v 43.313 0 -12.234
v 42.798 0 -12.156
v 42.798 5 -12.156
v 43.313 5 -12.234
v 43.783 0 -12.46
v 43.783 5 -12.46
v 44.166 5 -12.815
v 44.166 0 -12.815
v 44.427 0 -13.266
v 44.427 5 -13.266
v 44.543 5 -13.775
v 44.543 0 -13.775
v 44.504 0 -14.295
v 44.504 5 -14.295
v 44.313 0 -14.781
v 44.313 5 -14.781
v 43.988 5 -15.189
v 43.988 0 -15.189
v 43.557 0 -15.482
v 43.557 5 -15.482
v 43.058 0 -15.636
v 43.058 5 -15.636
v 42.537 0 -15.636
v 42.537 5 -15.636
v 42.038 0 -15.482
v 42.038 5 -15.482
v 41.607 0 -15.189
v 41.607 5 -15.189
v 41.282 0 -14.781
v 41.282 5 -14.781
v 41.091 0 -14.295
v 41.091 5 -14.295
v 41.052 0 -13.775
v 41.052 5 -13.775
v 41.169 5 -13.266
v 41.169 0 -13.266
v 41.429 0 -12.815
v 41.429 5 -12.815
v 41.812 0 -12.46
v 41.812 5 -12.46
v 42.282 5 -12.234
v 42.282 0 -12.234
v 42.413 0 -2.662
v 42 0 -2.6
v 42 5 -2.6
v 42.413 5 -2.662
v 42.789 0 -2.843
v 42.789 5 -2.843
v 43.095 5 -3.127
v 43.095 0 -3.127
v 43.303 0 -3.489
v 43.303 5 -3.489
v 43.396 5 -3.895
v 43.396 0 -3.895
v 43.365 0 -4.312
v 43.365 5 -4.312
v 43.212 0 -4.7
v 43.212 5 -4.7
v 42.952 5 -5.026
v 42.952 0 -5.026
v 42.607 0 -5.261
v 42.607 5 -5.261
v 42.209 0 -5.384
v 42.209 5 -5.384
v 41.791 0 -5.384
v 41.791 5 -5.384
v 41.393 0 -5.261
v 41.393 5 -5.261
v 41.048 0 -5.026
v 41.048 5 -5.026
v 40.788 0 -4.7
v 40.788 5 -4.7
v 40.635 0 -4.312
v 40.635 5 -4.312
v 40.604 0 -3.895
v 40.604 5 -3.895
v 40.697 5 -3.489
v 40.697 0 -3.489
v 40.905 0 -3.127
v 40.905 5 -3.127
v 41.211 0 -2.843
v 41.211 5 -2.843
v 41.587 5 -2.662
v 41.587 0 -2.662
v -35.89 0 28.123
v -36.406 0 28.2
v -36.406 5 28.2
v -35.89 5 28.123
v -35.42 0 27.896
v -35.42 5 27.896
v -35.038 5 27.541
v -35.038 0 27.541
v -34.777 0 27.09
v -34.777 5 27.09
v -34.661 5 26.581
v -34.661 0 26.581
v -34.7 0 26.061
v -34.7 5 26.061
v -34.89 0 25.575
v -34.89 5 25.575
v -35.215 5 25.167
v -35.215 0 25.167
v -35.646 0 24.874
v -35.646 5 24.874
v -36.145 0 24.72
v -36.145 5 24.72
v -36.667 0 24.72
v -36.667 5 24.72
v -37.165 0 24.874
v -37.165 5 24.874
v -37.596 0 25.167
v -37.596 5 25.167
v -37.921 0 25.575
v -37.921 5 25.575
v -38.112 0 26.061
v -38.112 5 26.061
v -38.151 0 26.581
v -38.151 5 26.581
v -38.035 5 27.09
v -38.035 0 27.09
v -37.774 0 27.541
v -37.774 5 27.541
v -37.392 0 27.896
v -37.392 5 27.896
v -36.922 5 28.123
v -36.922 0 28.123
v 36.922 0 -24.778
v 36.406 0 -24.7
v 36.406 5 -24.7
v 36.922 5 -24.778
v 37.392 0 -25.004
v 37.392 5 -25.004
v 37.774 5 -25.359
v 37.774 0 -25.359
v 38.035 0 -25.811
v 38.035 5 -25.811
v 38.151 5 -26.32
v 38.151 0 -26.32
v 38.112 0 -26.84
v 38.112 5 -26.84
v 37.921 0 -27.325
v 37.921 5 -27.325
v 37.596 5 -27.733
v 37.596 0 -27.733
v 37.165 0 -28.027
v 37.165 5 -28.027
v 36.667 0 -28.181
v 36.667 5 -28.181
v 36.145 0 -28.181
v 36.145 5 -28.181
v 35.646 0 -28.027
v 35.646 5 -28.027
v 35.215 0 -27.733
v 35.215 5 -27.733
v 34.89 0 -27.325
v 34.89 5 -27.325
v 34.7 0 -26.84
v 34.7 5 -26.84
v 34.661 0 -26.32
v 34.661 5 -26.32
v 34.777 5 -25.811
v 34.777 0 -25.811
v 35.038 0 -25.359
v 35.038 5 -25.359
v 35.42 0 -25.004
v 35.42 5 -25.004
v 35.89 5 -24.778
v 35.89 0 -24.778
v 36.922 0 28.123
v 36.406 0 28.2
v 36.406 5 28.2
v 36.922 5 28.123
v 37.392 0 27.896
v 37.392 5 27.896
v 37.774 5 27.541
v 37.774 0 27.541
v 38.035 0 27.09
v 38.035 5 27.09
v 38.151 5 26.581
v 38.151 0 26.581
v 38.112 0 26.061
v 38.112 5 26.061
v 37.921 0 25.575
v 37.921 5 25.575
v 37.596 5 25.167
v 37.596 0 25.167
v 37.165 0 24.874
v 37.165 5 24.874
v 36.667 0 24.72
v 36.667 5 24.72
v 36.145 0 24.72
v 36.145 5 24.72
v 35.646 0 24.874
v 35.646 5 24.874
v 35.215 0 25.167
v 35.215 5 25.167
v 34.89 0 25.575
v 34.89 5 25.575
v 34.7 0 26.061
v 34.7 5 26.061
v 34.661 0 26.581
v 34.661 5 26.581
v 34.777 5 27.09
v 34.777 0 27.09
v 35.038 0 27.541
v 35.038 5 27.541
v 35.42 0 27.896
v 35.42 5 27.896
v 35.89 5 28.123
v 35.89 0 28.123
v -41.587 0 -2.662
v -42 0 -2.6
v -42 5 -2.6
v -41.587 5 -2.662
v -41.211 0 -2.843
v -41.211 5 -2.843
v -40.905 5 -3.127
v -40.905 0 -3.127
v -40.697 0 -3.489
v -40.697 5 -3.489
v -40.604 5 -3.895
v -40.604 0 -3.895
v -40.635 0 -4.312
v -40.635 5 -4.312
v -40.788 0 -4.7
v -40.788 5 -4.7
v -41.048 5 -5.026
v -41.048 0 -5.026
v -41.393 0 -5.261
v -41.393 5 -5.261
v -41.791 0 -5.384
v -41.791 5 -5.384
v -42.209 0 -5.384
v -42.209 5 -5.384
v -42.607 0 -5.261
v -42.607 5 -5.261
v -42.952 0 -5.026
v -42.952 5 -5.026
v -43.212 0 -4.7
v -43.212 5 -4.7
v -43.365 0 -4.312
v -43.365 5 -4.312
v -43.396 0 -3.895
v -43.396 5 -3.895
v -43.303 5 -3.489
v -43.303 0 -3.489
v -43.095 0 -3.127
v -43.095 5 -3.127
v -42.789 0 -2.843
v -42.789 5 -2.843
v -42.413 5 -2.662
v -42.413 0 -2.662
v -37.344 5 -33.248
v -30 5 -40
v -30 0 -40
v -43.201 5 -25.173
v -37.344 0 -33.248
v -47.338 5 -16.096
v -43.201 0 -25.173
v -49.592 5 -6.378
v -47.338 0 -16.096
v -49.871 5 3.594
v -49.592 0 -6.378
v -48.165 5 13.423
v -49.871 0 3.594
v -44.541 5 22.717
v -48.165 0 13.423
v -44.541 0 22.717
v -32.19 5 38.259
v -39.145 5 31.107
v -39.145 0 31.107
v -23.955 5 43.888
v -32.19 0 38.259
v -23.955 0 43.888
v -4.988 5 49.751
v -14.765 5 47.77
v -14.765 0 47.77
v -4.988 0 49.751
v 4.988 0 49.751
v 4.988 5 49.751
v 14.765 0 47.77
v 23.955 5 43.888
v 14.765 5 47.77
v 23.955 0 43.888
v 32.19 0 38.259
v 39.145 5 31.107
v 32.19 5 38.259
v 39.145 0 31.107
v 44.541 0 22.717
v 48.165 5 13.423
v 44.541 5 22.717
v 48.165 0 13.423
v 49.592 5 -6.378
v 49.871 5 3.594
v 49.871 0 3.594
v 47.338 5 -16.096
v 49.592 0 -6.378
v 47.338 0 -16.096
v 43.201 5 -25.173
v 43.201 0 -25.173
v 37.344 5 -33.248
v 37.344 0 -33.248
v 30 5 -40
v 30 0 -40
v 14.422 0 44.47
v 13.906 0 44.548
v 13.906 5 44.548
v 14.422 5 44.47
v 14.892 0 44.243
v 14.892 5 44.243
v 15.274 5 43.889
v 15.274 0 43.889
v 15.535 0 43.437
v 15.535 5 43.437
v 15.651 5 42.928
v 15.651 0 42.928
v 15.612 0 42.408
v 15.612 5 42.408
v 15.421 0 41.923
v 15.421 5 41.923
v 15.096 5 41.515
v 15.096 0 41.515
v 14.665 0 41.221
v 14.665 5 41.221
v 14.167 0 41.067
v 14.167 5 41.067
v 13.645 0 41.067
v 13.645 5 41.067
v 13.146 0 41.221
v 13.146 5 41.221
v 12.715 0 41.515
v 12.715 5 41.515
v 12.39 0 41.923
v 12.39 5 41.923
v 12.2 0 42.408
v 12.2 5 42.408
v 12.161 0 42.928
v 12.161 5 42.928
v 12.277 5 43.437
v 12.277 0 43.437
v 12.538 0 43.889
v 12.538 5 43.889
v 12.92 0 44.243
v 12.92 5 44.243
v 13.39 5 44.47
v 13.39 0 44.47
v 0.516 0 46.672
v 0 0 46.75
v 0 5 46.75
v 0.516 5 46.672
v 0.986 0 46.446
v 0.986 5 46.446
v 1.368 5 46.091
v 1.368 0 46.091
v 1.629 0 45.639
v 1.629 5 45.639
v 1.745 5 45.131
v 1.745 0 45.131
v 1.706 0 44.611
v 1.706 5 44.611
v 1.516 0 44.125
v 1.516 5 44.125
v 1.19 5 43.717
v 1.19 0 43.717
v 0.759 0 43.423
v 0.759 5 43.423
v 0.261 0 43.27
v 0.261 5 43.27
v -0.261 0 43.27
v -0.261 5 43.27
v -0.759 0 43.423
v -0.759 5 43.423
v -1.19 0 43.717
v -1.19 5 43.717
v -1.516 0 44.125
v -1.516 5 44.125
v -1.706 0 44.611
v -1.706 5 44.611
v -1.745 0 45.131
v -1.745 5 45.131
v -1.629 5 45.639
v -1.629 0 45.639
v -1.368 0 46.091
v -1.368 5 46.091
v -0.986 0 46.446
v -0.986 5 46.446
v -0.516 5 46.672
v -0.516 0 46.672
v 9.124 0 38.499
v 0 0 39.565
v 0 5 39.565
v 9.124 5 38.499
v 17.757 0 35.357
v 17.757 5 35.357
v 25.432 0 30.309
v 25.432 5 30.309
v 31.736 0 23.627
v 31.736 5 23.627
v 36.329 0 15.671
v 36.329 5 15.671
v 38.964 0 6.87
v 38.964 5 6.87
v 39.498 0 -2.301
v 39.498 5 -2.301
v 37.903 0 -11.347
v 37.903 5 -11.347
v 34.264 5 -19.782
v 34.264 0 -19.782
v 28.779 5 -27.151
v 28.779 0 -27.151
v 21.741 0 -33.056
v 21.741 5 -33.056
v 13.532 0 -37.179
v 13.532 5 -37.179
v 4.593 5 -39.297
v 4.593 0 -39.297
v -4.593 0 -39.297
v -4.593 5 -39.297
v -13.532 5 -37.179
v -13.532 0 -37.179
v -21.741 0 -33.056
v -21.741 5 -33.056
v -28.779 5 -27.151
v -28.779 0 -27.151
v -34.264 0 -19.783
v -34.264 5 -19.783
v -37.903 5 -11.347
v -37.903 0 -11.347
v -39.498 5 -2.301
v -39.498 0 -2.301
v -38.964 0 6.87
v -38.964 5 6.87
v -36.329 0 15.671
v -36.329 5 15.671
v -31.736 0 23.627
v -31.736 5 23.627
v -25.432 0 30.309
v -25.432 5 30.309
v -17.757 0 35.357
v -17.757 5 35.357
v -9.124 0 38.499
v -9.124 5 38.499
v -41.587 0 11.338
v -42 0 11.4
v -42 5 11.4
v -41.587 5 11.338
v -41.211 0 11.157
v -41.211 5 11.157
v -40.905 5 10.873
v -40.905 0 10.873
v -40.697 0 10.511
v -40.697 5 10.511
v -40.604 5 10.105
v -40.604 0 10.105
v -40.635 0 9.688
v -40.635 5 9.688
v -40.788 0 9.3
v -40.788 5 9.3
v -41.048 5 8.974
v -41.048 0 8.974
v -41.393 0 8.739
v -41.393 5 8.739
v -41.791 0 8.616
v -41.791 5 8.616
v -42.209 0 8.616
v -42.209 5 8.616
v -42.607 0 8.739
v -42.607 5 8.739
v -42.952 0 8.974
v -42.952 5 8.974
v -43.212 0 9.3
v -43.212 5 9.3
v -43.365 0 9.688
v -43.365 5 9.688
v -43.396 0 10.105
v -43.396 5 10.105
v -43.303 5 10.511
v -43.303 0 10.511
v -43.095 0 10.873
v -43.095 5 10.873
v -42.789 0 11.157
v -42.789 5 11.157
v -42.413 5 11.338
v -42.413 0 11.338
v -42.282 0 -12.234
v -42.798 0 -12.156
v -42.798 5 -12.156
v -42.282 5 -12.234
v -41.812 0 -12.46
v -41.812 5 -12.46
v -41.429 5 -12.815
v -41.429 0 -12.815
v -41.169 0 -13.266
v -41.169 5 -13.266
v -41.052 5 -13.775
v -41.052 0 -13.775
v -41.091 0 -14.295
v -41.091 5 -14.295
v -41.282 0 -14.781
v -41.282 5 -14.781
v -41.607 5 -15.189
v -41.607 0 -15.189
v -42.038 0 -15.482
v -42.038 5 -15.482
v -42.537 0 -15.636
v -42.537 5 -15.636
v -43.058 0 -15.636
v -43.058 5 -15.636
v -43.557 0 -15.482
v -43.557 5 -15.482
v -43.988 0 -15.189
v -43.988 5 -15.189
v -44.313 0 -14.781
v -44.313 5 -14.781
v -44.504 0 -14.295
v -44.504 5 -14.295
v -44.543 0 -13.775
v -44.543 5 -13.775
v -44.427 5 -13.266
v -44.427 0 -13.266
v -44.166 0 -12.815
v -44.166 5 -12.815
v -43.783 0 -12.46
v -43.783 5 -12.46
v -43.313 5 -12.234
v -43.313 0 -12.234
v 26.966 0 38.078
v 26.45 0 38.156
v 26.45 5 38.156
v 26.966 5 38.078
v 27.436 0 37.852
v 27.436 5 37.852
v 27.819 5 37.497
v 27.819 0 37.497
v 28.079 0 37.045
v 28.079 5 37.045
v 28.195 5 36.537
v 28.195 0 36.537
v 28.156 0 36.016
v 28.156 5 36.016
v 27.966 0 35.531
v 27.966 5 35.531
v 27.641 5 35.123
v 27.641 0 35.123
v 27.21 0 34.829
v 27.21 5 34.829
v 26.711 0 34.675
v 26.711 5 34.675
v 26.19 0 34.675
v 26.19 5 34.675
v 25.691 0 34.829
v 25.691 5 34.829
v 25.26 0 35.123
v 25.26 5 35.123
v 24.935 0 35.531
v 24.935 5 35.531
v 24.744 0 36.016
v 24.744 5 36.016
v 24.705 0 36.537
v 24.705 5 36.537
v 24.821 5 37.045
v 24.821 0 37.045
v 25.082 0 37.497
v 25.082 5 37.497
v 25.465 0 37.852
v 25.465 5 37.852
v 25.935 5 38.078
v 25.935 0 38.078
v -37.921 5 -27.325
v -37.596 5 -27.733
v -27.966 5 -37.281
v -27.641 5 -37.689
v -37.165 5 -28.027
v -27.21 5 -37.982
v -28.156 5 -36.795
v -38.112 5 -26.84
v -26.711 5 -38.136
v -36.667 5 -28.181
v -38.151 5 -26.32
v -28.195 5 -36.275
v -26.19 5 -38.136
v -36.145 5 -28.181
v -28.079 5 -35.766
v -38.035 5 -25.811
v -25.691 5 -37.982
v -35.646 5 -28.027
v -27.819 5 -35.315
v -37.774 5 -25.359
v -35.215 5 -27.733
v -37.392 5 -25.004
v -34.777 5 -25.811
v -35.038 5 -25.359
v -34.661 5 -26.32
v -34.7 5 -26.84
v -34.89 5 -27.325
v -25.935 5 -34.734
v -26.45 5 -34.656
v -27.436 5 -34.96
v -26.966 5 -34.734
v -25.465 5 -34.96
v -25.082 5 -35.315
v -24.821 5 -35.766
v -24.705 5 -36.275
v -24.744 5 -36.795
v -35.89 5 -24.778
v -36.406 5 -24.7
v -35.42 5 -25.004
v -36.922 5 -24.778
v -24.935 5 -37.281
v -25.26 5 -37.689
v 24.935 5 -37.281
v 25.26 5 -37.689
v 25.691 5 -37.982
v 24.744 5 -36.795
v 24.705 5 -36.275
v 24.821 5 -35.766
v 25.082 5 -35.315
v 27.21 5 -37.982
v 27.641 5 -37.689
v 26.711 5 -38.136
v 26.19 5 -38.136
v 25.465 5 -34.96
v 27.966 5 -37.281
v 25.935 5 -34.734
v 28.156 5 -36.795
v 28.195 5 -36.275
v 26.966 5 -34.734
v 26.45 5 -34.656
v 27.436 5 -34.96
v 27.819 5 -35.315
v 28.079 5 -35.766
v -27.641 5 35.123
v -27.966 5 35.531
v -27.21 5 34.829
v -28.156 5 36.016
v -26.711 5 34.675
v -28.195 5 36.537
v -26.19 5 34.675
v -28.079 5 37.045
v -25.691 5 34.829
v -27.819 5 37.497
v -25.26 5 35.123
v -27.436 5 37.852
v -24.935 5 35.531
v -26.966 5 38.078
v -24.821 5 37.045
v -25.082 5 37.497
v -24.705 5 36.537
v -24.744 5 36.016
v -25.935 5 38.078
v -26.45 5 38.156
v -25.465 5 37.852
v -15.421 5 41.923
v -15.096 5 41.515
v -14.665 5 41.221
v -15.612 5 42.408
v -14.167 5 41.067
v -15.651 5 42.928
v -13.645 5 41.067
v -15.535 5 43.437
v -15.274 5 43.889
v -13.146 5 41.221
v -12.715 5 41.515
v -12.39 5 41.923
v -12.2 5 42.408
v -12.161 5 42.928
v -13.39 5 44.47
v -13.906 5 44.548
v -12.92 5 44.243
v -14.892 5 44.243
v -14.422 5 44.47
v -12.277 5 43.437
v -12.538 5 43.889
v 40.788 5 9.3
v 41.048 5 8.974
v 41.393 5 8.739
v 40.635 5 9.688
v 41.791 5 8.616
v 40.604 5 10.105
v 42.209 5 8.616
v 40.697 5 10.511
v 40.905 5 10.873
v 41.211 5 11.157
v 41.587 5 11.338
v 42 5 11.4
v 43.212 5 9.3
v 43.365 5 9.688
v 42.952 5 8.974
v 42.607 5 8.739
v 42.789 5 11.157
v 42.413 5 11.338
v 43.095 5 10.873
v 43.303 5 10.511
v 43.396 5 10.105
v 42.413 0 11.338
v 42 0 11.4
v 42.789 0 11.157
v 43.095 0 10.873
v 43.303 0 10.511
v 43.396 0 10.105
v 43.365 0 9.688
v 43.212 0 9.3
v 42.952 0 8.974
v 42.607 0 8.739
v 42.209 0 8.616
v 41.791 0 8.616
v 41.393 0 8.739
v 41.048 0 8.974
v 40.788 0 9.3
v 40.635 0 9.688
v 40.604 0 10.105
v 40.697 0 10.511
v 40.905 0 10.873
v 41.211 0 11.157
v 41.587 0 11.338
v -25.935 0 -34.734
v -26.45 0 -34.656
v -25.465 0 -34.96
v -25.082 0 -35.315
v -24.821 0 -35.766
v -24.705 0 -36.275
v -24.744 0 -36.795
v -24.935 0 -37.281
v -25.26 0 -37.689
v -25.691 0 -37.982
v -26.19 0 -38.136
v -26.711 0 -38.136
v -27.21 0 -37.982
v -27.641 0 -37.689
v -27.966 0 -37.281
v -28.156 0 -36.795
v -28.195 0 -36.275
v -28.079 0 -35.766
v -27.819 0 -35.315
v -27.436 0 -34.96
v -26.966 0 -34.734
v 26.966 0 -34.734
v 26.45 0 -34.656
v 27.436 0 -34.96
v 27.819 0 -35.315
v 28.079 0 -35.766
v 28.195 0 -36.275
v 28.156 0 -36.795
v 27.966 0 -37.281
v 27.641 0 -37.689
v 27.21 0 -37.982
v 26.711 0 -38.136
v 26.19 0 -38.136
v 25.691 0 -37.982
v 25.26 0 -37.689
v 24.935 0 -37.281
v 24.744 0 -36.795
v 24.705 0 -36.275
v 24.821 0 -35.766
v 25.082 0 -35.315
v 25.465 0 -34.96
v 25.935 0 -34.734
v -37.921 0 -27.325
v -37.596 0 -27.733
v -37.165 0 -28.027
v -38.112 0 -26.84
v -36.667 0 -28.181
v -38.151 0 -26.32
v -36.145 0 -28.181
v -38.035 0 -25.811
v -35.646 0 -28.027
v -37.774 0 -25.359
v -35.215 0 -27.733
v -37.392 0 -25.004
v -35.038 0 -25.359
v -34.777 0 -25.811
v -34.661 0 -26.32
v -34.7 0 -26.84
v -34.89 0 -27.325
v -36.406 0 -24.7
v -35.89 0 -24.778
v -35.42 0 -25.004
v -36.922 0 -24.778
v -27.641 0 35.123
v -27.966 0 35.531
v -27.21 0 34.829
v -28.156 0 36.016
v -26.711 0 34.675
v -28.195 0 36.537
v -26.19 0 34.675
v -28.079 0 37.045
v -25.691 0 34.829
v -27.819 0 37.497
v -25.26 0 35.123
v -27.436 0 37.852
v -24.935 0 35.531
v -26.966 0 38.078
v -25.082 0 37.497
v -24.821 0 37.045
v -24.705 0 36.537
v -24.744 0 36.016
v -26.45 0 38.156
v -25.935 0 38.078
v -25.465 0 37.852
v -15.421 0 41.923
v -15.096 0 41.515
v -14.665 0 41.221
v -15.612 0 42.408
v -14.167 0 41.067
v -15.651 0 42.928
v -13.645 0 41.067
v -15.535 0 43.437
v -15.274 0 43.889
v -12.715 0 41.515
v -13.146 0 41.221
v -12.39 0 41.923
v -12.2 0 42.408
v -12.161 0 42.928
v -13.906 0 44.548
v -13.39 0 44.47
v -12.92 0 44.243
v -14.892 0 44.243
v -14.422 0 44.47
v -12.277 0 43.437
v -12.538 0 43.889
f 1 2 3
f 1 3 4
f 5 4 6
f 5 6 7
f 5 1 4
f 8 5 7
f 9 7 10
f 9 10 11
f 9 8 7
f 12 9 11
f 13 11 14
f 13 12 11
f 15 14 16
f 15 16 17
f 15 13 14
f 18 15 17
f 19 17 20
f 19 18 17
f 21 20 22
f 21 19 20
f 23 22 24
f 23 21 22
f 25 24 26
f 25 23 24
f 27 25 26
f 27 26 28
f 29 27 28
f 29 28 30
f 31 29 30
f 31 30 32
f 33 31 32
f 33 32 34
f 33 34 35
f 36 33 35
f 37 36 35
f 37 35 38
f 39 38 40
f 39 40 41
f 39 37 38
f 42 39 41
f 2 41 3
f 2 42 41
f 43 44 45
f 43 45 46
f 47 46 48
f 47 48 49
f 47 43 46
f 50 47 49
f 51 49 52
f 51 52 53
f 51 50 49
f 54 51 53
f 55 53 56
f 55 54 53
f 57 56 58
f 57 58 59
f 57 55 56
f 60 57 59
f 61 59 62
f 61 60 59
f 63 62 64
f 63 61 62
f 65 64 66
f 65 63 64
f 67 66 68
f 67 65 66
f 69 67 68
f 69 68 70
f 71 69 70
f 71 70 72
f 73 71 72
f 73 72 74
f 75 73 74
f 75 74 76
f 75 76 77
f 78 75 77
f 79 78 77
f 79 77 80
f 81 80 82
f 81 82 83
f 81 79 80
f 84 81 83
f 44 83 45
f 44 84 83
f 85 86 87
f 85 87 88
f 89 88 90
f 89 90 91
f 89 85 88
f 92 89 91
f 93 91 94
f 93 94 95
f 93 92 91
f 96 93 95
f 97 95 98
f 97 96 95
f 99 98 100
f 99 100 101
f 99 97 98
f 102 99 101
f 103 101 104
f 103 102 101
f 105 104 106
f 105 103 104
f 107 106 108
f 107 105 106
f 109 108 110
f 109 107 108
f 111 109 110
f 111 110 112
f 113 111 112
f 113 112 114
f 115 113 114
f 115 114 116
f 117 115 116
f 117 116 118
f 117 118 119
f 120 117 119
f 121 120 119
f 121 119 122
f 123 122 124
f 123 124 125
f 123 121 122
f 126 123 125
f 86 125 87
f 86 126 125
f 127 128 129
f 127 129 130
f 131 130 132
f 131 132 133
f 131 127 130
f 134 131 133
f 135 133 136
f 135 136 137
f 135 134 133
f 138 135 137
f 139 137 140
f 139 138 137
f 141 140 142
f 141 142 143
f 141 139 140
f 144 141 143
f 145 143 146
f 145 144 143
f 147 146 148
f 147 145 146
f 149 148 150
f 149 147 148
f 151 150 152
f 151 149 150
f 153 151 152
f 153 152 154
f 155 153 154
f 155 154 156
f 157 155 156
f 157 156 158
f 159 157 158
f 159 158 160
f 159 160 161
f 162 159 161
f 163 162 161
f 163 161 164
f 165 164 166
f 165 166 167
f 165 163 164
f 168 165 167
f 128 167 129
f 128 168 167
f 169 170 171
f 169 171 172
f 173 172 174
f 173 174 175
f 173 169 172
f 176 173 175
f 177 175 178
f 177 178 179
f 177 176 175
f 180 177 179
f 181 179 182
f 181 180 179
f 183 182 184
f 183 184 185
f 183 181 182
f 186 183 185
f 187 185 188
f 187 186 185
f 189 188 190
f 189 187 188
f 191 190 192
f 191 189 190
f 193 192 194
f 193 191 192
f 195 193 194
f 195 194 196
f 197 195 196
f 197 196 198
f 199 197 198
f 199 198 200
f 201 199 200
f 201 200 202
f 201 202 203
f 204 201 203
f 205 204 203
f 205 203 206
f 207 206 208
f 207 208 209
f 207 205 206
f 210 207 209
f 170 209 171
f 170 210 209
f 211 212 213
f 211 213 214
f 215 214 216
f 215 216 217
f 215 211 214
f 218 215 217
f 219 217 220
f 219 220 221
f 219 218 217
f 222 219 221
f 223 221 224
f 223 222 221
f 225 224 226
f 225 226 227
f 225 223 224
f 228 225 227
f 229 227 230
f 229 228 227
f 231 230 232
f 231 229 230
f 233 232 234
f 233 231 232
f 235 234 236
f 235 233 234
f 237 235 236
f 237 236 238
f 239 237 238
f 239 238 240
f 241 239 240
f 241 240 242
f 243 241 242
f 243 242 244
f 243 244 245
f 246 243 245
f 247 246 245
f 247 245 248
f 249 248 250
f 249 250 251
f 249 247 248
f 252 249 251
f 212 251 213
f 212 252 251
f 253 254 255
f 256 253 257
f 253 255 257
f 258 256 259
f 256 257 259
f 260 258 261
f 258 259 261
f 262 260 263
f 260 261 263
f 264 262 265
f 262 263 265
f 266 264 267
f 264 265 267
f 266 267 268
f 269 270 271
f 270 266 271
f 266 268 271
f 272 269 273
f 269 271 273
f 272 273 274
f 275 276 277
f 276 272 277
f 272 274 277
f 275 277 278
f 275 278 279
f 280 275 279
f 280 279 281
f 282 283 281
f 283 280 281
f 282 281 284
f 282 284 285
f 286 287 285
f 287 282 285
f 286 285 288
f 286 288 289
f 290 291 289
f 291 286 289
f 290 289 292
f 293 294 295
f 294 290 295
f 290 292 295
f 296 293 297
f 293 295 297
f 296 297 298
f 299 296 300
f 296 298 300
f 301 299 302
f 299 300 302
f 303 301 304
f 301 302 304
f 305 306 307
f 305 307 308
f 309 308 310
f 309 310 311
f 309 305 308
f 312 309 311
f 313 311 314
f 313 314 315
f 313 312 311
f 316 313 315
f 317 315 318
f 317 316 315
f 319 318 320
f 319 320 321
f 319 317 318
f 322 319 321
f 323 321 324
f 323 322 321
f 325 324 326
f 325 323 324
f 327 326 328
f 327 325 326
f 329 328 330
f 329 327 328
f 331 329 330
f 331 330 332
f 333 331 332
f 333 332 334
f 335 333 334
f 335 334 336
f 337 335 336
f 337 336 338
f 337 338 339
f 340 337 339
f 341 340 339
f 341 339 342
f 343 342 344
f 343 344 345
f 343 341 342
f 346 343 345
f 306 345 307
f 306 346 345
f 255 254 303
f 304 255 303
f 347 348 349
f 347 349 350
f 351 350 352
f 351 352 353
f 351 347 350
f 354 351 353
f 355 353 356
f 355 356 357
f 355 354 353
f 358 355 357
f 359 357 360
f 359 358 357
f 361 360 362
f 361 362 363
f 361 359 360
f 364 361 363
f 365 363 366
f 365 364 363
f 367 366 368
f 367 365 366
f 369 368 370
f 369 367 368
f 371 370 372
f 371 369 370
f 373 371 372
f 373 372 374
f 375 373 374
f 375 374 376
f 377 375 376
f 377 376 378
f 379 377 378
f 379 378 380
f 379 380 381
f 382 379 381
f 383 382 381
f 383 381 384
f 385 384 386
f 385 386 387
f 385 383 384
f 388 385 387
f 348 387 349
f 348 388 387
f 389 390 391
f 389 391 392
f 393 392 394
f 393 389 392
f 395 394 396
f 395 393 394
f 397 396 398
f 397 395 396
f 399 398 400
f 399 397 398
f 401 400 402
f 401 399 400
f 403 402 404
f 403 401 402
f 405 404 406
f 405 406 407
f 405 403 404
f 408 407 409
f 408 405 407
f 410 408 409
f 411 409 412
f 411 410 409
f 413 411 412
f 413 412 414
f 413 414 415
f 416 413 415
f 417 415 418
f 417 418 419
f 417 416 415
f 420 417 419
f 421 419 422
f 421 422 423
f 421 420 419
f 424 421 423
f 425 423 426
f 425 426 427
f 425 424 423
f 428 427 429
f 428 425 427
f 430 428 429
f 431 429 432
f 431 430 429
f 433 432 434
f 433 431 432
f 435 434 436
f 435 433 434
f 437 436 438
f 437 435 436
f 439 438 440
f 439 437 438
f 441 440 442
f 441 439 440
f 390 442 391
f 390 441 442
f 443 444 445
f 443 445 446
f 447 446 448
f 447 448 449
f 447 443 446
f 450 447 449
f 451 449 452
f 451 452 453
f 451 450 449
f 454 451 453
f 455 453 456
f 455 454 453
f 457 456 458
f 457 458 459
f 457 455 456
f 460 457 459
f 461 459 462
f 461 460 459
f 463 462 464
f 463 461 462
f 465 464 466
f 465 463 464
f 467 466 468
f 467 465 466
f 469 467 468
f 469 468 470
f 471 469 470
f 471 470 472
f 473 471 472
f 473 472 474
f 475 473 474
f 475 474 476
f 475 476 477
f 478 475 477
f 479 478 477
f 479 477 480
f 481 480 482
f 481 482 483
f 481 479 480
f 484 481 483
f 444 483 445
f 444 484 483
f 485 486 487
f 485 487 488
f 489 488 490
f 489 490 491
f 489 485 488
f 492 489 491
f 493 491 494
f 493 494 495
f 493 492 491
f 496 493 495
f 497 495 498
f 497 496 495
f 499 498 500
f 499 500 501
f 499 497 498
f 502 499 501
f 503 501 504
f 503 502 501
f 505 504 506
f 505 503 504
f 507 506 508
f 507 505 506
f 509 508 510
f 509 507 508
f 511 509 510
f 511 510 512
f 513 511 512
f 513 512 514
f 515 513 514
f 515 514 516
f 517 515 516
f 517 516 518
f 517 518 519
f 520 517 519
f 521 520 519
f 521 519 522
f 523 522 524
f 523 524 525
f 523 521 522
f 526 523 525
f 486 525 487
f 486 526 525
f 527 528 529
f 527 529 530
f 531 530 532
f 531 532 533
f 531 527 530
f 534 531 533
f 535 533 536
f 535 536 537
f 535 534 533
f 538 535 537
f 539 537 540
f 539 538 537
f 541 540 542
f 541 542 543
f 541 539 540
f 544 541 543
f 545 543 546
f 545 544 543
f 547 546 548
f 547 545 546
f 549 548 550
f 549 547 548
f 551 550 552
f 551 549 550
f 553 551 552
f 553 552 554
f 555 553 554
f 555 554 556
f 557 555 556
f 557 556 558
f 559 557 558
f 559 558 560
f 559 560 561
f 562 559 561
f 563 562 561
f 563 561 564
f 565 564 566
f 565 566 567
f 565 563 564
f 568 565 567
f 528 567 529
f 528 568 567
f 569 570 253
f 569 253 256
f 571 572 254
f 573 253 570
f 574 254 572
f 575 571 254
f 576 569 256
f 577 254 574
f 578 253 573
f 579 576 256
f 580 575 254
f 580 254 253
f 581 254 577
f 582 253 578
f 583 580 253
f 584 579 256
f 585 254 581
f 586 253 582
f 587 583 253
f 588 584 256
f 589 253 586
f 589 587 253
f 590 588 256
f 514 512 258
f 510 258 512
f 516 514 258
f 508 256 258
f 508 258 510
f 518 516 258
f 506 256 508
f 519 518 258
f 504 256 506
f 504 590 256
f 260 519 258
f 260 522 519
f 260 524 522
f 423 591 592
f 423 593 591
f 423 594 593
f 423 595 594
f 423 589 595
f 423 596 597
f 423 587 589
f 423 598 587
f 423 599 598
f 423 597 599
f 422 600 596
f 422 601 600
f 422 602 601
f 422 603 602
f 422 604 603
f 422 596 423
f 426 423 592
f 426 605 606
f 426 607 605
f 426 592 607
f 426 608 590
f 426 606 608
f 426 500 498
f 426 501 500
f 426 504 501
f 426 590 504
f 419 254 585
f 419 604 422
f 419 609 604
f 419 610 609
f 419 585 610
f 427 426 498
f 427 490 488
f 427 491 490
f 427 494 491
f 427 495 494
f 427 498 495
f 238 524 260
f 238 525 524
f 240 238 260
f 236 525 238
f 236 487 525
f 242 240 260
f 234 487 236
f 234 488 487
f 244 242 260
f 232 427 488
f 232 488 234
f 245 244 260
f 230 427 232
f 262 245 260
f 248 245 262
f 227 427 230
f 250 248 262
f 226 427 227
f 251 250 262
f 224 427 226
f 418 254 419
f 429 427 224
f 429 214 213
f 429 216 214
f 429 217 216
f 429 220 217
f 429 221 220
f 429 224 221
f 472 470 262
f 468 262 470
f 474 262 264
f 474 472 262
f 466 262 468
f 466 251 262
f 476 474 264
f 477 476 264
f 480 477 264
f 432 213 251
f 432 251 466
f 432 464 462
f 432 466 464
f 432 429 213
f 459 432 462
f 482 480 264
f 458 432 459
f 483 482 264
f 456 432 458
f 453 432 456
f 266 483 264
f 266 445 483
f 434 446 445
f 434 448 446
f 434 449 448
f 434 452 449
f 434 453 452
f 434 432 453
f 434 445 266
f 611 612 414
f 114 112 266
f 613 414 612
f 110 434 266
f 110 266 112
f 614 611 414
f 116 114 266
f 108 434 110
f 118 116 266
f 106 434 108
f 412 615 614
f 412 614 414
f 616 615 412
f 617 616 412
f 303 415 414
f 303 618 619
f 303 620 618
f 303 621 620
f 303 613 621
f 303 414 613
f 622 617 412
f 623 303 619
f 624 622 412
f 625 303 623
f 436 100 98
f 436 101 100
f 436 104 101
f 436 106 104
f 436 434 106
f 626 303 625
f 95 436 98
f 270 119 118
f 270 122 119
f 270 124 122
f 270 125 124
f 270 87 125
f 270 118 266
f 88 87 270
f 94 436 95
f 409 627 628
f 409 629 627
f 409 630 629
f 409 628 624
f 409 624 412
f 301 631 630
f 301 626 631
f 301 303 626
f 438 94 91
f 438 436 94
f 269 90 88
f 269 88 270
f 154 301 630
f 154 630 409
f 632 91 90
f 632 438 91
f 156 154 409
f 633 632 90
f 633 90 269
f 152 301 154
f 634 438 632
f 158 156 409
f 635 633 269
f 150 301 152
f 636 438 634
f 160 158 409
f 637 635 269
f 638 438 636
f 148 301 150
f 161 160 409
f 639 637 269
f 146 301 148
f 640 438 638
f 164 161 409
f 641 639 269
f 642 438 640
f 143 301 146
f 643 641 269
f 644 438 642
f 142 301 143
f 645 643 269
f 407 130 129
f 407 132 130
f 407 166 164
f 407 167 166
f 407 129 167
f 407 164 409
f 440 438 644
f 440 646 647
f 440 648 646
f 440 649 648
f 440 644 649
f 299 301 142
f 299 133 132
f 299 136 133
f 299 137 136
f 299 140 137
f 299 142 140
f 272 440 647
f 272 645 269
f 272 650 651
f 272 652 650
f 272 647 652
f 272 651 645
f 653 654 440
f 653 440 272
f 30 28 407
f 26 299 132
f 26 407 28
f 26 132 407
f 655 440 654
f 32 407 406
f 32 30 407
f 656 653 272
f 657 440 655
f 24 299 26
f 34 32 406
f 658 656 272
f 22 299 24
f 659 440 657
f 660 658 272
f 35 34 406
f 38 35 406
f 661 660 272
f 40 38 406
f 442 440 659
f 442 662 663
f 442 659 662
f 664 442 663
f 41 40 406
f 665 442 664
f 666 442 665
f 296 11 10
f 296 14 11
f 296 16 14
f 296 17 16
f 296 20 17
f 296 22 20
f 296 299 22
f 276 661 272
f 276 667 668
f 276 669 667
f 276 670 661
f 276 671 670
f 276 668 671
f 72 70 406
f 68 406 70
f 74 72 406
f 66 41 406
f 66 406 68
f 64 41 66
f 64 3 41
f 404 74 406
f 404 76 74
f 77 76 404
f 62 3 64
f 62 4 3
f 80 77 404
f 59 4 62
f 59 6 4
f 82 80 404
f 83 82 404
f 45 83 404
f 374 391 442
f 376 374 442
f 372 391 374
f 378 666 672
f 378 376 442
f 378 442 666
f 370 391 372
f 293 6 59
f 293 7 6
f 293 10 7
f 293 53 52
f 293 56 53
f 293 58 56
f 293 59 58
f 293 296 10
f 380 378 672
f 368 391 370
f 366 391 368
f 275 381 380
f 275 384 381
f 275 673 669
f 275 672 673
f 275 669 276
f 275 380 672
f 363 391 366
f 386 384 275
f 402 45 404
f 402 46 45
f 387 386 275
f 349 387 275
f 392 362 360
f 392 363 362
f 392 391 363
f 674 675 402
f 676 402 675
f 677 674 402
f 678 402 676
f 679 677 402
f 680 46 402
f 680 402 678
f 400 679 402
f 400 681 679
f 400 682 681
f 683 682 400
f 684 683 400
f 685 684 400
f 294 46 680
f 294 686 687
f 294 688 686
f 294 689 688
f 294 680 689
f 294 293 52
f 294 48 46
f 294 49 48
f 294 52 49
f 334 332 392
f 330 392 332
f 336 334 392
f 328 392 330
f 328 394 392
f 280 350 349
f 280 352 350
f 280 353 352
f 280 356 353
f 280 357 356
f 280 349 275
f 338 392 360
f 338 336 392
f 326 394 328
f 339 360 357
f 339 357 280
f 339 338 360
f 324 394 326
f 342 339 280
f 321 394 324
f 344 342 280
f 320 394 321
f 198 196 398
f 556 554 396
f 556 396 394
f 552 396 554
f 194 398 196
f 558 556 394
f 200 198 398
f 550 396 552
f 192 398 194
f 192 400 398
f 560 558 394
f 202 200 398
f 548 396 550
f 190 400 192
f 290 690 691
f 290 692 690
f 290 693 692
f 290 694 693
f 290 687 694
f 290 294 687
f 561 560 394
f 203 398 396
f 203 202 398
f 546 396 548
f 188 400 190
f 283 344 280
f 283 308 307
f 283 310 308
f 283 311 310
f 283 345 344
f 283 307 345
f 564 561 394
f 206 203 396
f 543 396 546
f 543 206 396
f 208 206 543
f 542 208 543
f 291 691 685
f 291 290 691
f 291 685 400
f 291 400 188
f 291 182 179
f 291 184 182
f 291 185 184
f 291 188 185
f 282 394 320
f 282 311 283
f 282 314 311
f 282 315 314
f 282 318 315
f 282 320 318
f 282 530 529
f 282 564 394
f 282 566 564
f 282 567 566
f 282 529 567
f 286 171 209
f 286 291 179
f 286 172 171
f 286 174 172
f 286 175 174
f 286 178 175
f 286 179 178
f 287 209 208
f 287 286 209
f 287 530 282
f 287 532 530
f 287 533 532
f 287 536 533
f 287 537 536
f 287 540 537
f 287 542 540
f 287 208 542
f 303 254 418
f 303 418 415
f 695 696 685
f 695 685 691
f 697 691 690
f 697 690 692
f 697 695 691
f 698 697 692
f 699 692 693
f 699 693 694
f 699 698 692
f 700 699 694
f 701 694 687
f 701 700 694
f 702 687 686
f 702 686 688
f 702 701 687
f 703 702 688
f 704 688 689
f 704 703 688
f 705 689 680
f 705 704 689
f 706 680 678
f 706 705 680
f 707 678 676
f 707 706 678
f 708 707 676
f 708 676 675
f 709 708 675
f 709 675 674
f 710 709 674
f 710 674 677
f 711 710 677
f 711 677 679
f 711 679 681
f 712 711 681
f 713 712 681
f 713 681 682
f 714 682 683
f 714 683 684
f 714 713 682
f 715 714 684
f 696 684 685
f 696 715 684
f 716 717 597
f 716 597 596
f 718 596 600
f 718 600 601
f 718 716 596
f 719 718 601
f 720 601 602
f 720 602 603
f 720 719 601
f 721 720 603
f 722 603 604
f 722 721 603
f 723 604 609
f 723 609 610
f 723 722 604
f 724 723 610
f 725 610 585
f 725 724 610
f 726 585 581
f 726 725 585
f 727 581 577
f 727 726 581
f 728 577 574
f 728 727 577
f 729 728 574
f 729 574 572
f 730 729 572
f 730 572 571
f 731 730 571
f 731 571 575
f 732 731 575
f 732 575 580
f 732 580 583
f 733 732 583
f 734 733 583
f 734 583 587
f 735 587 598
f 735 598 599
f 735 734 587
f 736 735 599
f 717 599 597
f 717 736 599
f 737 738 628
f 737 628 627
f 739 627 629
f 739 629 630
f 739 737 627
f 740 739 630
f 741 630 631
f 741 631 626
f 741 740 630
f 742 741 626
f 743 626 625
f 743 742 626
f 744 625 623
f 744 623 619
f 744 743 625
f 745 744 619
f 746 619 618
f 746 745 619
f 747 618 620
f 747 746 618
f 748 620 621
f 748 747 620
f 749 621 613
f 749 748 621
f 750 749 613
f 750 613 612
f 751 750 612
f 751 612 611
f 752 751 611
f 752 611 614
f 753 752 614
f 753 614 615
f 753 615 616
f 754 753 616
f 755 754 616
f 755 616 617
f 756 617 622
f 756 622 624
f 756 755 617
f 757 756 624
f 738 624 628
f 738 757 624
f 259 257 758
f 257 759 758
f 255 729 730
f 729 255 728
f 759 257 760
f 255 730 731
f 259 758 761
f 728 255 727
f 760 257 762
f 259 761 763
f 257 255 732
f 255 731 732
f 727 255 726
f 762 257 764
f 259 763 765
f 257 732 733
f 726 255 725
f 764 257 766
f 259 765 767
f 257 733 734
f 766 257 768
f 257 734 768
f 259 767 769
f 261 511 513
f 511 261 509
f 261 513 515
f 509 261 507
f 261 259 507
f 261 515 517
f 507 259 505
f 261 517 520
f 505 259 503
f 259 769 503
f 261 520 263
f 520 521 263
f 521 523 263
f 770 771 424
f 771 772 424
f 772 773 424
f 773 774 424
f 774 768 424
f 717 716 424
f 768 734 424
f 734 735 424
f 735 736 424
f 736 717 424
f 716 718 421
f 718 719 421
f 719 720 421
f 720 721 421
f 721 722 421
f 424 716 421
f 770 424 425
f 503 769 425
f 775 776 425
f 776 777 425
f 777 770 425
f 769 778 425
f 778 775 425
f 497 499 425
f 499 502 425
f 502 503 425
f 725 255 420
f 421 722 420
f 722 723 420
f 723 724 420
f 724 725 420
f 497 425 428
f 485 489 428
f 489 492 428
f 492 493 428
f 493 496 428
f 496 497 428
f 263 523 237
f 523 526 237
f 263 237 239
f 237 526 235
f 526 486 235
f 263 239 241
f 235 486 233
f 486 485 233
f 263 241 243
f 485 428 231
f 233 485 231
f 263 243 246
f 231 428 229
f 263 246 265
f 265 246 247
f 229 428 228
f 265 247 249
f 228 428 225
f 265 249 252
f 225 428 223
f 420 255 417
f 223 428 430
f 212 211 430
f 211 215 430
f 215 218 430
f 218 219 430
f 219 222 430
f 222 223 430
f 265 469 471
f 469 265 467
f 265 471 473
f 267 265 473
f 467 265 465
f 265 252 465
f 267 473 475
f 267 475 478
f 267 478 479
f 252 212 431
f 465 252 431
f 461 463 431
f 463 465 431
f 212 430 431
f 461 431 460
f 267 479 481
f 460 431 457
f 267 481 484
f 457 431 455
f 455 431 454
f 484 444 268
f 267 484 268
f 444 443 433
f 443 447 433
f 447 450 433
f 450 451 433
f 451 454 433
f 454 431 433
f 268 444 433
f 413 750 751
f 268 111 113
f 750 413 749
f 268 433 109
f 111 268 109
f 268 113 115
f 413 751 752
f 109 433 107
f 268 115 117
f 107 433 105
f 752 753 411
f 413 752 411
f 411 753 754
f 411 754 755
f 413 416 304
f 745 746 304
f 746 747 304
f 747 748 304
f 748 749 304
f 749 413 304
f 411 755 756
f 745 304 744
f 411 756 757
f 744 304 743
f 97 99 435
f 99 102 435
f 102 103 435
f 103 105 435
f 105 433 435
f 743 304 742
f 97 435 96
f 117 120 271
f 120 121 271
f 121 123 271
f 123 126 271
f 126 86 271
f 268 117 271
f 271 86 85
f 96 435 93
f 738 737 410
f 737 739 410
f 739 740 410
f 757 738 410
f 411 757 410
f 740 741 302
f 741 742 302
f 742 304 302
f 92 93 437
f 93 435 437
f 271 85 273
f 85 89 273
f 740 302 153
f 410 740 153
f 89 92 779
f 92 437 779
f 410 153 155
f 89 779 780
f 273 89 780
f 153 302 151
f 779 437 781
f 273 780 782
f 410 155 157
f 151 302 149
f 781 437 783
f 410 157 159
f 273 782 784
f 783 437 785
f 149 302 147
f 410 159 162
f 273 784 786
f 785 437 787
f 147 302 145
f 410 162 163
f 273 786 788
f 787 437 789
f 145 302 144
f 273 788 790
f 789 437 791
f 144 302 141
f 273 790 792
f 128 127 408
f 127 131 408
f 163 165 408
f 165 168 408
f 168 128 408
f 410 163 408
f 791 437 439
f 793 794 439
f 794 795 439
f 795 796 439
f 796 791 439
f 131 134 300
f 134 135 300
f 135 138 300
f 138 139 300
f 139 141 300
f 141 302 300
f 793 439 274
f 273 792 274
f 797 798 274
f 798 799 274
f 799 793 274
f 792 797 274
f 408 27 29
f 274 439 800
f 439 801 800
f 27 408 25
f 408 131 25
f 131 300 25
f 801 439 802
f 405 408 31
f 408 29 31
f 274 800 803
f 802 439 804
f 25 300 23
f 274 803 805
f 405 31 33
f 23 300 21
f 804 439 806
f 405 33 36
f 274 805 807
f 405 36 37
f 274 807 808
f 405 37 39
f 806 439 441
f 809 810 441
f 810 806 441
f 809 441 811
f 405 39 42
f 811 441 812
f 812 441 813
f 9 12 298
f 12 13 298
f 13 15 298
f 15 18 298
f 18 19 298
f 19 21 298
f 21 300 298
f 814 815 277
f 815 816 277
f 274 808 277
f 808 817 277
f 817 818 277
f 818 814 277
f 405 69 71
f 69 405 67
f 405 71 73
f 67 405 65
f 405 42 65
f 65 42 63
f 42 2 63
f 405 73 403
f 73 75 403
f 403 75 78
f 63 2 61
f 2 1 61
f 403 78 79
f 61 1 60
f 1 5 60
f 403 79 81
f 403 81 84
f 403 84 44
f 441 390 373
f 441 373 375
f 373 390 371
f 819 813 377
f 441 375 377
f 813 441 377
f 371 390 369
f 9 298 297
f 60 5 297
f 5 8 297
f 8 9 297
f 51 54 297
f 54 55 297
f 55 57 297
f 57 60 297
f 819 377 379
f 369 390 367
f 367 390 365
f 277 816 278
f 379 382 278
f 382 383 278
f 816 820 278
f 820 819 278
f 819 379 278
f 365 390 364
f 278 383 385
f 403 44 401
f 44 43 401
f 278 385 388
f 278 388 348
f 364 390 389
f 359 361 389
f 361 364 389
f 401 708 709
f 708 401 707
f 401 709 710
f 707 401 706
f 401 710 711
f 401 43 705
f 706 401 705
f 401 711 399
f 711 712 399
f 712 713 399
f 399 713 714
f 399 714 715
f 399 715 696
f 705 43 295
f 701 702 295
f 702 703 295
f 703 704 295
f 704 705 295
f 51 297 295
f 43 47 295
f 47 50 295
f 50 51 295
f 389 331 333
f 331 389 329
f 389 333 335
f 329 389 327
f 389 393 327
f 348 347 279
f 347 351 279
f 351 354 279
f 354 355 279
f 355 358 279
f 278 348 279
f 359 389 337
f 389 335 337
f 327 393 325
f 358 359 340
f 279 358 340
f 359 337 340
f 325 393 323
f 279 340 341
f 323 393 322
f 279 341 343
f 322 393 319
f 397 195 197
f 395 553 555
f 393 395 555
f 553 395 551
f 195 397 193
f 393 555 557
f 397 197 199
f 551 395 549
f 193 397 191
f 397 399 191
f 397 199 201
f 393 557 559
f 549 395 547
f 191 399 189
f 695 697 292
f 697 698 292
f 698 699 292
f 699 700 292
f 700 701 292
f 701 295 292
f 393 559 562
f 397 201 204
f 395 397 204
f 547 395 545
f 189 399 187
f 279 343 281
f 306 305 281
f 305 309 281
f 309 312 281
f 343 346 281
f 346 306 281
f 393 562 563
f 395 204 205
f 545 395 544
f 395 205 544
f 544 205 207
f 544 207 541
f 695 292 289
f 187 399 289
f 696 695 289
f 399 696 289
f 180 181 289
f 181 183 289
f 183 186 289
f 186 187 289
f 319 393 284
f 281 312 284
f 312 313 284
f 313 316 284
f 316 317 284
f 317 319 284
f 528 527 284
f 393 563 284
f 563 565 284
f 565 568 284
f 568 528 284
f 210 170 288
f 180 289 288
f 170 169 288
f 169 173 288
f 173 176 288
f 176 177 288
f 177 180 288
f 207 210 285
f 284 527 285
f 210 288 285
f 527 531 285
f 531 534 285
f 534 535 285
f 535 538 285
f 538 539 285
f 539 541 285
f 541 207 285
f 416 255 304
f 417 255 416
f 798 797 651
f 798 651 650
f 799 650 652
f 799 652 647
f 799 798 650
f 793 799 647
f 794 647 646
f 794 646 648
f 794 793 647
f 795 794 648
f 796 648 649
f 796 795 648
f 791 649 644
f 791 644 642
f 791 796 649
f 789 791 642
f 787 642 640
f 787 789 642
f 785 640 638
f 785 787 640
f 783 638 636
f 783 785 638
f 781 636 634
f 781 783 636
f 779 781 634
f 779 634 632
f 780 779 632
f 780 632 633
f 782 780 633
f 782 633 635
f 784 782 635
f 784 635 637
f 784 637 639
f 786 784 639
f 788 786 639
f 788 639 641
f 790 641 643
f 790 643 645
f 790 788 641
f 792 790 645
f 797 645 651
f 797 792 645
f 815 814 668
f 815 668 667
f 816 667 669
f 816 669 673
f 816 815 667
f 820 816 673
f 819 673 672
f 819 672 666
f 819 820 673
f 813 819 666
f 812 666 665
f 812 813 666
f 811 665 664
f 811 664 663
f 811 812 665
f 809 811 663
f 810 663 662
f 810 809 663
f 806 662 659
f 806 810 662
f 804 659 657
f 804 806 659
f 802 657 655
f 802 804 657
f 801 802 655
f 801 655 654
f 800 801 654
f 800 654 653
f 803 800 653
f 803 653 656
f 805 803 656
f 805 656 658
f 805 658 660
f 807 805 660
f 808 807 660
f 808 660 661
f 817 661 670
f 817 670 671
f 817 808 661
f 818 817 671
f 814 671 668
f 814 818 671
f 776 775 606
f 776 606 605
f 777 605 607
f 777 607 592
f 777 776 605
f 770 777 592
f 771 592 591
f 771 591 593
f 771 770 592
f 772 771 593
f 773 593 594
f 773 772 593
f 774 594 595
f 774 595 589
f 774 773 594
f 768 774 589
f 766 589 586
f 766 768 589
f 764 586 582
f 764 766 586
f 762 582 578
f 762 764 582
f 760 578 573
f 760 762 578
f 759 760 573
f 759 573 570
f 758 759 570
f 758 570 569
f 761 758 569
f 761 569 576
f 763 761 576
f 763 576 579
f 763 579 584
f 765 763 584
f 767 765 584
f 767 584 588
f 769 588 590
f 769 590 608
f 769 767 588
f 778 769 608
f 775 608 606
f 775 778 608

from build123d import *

# Parameters (mm, degrees)
SKETCH4_R           = 50
SKETCH4_R_2         = 39.565
SKETCH4_R_3         = 1.4
SKETCH4_R_4         = 1.75
BOSS_EXTRUDE3_DEPTH = 5
CUT_EXTRUDE1_START  = -40
SKETCH10_W          = 119.00246232
SKETCH10_H          = 31.760523389
CUT_EXTRUDE1_DEPTH  = 31.887234394


with BuildPart() as part:
    # Sketch4 → Boss-Extrude3 (new body)
    with BuildSketch(Plane(origin=(0, 0, 0), x_dir=(1, 0, 0), z_dir=(0, 1, 0))):
        Circle(SKETCH4_R)
        Circle(SKETCH4_R_2, mode=Mode.SUBTRACT)
        with Locations((42, -10)):
            Circle(SKETCH4_R_3, mode=Mode.SUBTRACT)
        with Locations((42, 4)):
            Circle(SKETCH4_R_3, mode=Mode.SUBTRACT)
        with Locations((-42, -10)):
            Circle(SKETCH4_R_3, mode=Mode.SUBTRACT)
        with Locations((-42, 4)):
            Circle(SKETCH4_R_3, mode=Mode.SUBTRACT)
        with Locations((0, -45)):
            Circle(SKETCH4_R_4, mode=Mode.SUBTRACT)
        with Locations((-13.905764747, -42.797543233)):
            Circle(SKETCH4_R_4, mode=Mode.SUBTRACT)
        with Locations((-26.450336353, -36.405764747)):
            Circle(SKETCH4_R_4, mode=Mode.SUBTRACT)
        with Locations((-36.405764747, -26.450336353)):
            Circle(SKETCH4_R_4, mode=Mode.SUBTRACT)
        with Locations((-42.797543233, 13.905764747)):
            Circle(SKETCH4_R_4, mode=Mode.SUBTRACT)
        with Locations((-36.405764747, 26.450336353)):
            Circle(SKETCH4_R_4, mode=Mode.SUBTRACT)
        with Locations((-26.450336353, 36.405764747)):
            Circle(SKETCH4_R_4, mode=Mode.SUBTRACT)
        with Locations((26.450336353, 36.405764747)):
            Circle(SKETCH4_R_4, mode=Mode.SUBTRACT)
        with Locations((36.405764747, 26.450336353)):
            Circle(SKETCH4_R_4, mode=Mode.SUBTRACT)
        with Locations((42.797543233, 13.905764747)):
            Circle(SKETCH4_R_4, mode=Mode.SUBTRACT)
        with Locations((36.405764747, -26.450336353)):
            Circle(SKETCH4_R_4, mode=Mode.SUBTRACT)
        with Locations((26.450336353, -36.405764747)):
            Circle(SKETCH4_R_4, mode=Mode.SUBTRACT)
        with Locations((13.905764747, -42.797543233)):
            Circle(SKETCH4_R_4, mode=Mode.SUBTRACT)
    extrude(amount=BOSS_EXTRUDE3_DEPTH)

    # Sketch10 → Cut-Extrude1 (cut, through all)
    with BuildSketch(Plane.XY.offset(CUT_EXTRUDE1_START)):
        with Locations((0.119400464, 6.241721298)):
            Rectangle(SKETCH10_W, SKETCH10_H)
    extrude(amount=-CUT_EXTRUDE1_DEPTH, mode=Mode.SUBTRACT)


solid = part.part
